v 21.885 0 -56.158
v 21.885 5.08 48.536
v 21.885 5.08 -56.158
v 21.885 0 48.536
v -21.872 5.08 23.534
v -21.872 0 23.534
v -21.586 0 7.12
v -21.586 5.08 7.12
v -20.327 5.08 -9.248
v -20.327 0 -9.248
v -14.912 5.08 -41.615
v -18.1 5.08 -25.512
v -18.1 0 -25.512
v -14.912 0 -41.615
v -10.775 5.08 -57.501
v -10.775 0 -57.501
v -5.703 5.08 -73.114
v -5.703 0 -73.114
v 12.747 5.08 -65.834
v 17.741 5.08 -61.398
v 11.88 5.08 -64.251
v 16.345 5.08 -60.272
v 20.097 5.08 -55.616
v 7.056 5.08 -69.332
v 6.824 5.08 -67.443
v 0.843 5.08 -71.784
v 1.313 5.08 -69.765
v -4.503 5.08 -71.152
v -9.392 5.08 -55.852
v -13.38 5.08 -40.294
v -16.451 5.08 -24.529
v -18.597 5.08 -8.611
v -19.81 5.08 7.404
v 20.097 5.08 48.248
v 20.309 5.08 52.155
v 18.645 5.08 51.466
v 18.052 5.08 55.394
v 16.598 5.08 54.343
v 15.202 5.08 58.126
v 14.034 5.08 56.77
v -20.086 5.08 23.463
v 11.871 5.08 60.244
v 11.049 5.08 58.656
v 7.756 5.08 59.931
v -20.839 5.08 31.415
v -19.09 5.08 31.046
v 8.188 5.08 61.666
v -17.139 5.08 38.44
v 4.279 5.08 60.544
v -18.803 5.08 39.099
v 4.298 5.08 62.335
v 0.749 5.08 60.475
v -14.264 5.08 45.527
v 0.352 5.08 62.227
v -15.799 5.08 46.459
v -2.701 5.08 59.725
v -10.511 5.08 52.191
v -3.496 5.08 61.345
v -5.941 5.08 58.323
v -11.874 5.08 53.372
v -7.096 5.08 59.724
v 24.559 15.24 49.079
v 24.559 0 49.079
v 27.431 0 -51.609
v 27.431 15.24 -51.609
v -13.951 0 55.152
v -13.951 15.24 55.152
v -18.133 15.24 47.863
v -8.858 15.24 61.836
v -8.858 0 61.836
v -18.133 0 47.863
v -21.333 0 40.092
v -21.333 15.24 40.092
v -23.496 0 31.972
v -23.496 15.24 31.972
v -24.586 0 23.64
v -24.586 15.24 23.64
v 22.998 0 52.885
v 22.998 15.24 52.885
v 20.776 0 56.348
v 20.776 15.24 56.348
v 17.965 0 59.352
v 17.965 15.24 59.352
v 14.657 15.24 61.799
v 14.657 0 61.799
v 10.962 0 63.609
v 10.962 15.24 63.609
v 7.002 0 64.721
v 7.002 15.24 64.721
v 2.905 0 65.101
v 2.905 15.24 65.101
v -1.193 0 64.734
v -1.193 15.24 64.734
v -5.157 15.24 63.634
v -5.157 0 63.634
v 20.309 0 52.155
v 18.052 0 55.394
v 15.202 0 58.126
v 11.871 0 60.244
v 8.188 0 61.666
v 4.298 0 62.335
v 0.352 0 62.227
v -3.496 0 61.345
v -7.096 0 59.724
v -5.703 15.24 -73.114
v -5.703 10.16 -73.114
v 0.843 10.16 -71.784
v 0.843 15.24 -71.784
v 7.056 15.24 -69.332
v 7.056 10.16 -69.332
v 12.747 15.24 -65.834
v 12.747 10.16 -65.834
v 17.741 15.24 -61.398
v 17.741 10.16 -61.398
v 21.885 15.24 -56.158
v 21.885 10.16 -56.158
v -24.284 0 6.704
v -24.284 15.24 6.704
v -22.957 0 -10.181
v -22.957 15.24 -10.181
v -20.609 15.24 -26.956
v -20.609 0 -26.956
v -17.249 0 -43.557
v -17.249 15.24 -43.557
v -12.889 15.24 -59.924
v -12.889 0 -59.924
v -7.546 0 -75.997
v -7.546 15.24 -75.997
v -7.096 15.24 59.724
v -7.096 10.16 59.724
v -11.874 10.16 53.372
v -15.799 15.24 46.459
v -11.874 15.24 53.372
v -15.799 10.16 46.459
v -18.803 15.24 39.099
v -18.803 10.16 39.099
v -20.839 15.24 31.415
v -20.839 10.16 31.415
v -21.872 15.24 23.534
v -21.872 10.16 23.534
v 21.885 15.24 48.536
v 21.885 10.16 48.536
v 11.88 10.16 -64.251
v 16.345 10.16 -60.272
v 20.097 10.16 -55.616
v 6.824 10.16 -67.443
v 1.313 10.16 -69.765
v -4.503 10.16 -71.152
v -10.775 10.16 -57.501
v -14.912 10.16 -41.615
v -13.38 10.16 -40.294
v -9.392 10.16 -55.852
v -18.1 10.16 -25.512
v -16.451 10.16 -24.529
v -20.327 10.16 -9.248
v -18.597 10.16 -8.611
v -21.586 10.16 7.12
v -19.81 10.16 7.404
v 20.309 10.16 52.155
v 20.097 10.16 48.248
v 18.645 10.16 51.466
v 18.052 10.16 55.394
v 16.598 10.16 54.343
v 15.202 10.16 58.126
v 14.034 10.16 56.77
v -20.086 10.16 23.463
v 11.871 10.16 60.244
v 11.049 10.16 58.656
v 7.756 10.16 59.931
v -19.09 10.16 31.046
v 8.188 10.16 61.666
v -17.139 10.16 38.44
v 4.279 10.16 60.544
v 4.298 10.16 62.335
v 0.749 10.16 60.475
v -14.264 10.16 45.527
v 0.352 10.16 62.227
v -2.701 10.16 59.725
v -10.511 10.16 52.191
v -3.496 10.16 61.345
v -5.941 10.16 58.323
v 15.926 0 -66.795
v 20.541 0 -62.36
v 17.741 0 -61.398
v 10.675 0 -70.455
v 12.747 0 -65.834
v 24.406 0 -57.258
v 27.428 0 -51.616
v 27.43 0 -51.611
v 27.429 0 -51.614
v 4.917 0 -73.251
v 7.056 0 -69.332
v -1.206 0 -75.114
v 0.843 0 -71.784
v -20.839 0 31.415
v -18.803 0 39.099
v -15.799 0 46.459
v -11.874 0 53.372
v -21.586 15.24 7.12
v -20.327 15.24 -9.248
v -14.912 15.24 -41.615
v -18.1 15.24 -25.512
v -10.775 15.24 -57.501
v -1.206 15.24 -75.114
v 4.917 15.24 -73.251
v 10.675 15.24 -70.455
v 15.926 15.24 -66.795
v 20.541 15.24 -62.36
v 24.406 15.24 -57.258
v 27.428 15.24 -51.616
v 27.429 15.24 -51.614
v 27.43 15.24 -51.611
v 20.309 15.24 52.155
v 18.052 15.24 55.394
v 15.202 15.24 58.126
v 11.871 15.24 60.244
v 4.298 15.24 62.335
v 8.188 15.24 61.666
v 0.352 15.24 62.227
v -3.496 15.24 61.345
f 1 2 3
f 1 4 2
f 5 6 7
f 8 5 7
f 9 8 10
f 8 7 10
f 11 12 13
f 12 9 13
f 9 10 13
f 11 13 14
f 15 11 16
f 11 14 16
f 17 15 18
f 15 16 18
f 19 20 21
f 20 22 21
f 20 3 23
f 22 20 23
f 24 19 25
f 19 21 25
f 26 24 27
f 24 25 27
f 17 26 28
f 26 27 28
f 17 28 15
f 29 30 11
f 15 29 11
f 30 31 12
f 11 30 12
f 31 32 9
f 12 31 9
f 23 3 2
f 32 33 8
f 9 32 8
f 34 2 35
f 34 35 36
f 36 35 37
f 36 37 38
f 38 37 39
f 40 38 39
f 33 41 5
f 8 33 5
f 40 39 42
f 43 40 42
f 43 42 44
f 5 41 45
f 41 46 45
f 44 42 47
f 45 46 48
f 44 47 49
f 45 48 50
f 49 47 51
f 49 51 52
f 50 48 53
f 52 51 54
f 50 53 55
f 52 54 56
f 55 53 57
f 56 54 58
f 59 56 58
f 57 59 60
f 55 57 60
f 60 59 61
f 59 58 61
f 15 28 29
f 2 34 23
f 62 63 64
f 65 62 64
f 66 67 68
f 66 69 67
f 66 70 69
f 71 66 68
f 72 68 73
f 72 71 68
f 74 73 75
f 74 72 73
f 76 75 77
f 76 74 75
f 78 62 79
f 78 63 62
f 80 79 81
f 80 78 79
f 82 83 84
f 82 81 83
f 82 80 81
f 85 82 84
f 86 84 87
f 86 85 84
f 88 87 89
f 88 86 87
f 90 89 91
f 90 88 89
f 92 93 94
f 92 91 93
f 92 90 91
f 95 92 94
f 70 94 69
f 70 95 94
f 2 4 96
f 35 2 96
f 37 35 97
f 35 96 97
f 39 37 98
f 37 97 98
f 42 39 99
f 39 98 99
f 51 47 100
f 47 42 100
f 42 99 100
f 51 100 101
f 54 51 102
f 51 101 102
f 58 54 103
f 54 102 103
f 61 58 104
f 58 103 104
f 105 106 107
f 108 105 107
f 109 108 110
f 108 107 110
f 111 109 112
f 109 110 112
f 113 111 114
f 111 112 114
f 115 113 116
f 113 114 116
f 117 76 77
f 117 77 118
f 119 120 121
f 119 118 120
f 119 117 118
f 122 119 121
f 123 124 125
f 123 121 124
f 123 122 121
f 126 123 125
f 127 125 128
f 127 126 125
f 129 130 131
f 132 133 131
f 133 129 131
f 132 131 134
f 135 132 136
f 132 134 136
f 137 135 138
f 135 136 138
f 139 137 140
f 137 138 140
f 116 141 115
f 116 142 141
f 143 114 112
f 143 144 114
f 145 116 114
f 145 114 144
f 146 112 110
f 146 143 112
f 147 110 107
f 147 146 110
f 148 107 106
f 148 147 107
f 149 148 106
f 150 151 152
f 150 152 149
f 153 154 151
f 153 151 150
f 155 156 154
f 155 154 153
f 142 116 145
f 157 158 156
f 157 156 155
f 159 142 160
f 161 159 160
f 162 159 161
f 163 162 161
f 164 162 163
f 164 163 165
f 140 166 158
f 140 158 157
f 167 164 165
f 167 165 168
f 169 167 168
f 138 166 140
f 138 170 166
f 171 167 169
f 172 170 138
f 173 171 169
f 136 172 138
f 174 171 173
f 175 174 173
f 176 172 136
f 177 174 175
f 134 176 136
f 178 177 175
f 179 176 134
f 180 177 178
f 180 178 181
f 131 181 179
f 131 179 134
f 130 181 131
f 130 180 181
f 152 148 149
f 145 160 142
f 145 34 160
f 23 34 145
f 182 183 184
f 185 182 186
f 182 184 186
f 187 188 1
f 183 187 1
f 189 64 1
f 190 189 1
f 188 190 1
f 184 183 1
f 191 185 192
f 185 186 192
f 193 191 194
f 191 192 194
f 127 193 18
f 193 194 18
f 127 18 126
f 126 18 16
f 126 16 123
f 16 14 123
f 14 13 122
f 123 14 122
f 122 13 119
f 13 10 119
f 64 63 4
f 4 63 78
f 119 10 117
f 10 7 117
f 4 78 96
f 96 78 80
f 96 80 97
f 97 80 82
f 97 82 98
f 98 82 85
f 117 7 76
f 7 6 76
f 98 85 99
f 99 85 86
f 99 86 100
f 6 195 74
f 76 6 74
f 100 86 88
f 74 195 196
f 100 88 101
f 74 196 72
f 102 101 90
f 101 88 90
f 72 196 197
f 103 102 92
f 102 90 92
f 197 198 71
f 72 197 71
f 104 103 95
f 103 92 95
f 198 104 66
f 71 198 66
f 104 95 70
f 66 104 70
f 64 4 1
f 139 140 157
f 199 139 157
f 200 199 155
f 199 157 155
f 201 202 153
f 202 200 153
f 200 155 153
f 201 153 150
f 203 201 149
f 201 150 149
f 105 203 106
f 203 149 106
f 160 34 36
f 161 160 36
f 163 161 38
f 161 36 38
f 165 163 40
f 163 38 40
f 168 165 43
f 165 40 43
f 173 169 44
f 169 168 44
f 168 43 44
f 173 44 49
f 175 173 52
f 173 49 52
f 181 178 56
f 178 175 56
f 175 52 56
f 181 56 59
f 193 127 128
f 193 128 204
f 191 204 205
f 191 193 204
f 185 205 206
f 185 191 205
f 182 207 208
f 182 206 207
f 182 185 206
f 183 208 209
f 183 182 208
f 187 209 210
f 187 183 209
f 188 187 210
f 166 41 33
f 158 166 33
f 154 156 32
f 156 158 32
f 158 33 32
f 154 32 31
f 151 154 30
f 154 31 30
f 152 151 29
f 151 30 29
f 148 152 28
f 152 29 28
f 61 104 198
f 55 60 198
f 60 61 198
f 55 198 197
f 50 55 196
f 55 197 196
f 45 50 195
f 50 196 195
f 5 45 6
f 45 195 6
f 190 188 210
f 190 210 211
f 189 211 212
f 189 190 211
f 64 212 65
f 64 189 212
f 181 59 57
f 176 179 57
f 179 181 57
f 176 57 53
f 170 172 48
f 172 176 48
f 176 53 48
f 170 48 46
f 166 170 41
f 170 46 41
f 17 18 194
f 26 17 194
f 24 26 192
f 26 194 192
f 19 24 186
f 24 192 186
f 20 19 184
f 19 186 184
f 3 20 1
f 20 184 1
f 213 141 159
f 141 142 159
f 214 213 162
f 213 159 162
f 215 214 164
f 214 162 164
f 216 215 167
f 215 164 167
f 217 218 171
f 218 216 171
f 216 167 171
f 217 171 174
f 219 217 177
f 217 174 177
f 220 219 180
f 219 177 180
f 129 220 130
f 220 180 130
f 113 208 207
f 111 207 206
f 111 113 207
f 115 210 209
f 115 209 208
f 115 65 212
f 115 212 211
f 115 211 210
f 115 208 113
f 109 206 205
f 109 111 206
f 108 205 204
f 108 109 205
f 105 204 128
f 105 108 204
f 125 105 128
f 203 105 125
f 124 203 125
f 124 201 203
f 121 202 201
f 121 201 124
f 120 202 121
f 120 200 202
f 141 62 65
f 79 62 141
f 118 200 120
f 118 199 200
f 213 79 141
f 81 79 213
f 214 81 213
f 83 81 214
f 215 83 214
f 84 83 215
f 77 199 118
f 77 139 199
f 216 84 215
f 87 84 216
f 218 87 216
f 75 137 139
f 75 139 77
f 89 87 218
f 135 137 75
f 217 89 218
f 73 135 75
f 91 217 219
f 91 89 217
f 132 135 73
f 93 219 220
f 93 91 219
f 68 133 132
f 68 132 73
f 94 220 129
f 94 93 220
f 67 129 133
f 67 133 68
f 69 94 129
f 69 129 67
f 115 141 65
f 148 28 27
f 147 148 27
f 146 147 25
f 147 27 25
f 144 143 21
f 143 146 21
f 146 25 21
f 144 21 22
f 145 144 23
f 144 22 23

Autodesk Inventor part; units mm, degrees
ref_plane "YZ Plane" through (0, 0, 0) normal (1, 0, 0) x (0, 1, 0)
ref_plane "XY Plane" through (0, 0, 0) normal (0, 0, 1) x (1, 0, 0)
sketch "Sketch1" plane through (0, 0, 0) normal (0, 1, 0) x (-1, 0, 0)
  arc A0 (24.5855, 23.6396) -> (8.8578, 61.8356) centre (-39.8212, 19.4554) ccw
  arc A1 (8.8578, 61.8356) -> (-24.5592, 49.0787) centre (-2.8694, 42.4084) ccw
  arc A2 (-27.4284, -51.6159) -> (7.5457, -75.9974) centre (10.0017, -35.1993) ccw
  arc A3 (7.5457, -75.9974) -> (24.5855, 23.6396) centre (-254.8198, 20.1477) ccw
  arc A4 (21.8724, 23.5336) -> (7.0955, 59.7239) centre (-39.8212, 19.4554) ccw
  arc A5 (7.0955, 59.7239) -> (-21.8846, 48.5356) centre (-2.8694, 42.4084) ccw
  arc A6 (-21.8846, -56.1581) -> (5.7032, -73.1142) centre (10.0017, -35.1993) ccw
  arc A7 (5.7032, -73.1142) -> (21.8724, 23.5336) centre (-254.8198, 20.1477) ccw
  line L0 (-21.8846, 48.5356) -> (-21.8846, -56.1581)
  line L1 (-24.5592, 49.0787) -> (-27.4313, -51.6092)
  arc A8 (24.5855, 23.6396) -> (8.8578, 61.8356) centre (-39.8212, 19.4554) ccw
  arc A9 (8.8578, 61.8356) -> (-24.5592, 49.0787) centre (-2.8694, 42.4084) ccw
  arc A10 (-27.4313, -51.6092) -> (7.5457, -75.9974) centre (10.0017, -35.1993) ccw
  arc A11 (7.5457, -75.9974) -> (24.5855, 23.6396) centre (-254.8198, 20.1477) ccw
  line L2 (-24.5592, 49.0787) -> (-27.4313, -51.6092)
  point P0 (0, 0)
extrude "Extrusion1" add sketch "Sketch1" along normal blind 15.24
sketch "Sketch2" plane through (0, 0, 0) normal (0, 1, 0) x (-1, 0, 0)
  arc A0 (21.8724, 23.5336) -> (7.0955, 59.7239) centre (-39.8212, 19.4554) ccw projected
  arc A1 (5.7032, -73.1142) -> (21.8724, 23.5336) centre (-254.8198, 20.1477) ccw projected
  arc A2 (-21.8846, -56.1581) -> (5.7032, -73.1142) centre (10.0017, -35.1993) ccw projected
  line L0 (-21.8846, -56.1581) -> (-21.8846, 48.5356) projected
  arc A3 (7.0955, 59.7239) -> (-21.8846, 48.5356) centre (-2.8694, 42.4084) ccw projected
  arc A4 (20.2233, 23.4688) -> (6.03, 58.4313) centre (-39.8212, 19.4554) ccw
  arc A5 (6.03, 58.4313) -> (-20.235, 48.2707) centre (-2.8694, 42.4084) ccw
  line L1 (-20.235, 48.2707) -> (-20.235, -55.6586)
  arc A6 (-20.235, -55.6586) -> (4.5953, -71.3048) centre (10.0017, -35.1993) ccw
  arc A7 (4.5953, -71.3048) -> (20.2233, 23.4688) centre (-254.8198, 20.1477) ccw
  arc A8 (21.96, 23.537) -> (7.1522, 59.7924) centre (-39.8212, 19.4554) ccw
  arc A9 (7.1522, 59.7924) -> (-21.9723, 48.5494) centre (-2.8694, 42.4084) ccw
  line L2 (-21.9723, 48.5494) -> (-21.9723, -56.1844)
  arc A10 (-21.9723, -56.1844) -> (5.7624, -73.209) centre (10.0017, -35.1993) ccw
  arc A11 (5.7624, -73.209) -> (21.96, 23.537) centre (-254.8198, 20.1477) ccw
  point P0 (0, 0)
ref_plane "Work Plane2" through (0, 7.62, 0) normal (0, 1, 0) x (-1, 0, 0)
sketch "Sketch3" plane through (0, 7.62, 0) normal (0, 1, 0) x (-1, 0, 0)
  arc A0 (21.8724, 23.5336) -> (7.0955, 59.7239) centre (-39.8212, 19.4554) ccw projected
  arc A1 (5.7032, -73.1142) -> (21.8724, 23.5336) centre (-254.8198, 20.1477) ccw projected
  arc A2 (-21.8846, -56.1581) -> (5.7032, -73.1142) centre (10.0017, -35.1993) ccw projected
  arc A3 (5.7032, -73.1142) -> (21.8724, 23.5336) centre (-254.8198, 20.1477) ccw projected
  arc A4 (-21.8846, -56.1581) -> (5.7032, -73.1142) centre (10.0017, -35.1993) ccw projected
  line L0 (-21.8846, -56.1581) -> (-21.8846, 48.5356) projected
  arc A5 (7.0955, 59.7239) -> (-21.8846, 48.5356) centre (-2.8694, 42.4084) ccw projected
  arc A6 (21.8724, 23.5336) -> (7.0955, 59.7239) centre (-39.8212, 19.4554) ccw projected
  arc A7 (8.8578, 61.8356) -> (-24.5592, 49.0787) centre (-2.8694, 42.4084) ccw projected
  line L1 (-24.5592, 49.0787) -> (-27.4313, -51.6092) projected
  arc A8 (-27.4313, -51.6092) -> (7.5457, -75.9974) centre (10.0017, -35.1993) ccw projected
  arc A9 (7.5457, -75.9974) -> (24.5855, 23.6396) centre (-254.8198, 20.1477) ccw projected
  arc A10 (24.5855, 23.6396) -> (8.8578, 61.8356) centre (-39.8212, 19.4554) ccw projected
  arc A11 (20.0927, 23.4636) -> (5.7444, 58.5644) centre (-39.8212, 19.4554) ccw
  arc A12 (4.508, -71.1594) -> (20.0927, 23.4636) centre (-254.8198, 20.1477) ccw
  arc A13 (-20.3969, -55.1802) -> (4.508, -71.1594) centre (10.0017, -35.1993) ccw
  line L2 (-20.0973, 48.248) -> (-20.0973, -55.6163)
  arc A14 (-20.0973, -55.6163) -> (4.5033, -71.1517) centre (10.0017, -35.1993) ccw
  arc A15 (4.5033, -71.1517) -> (20.0858, 23.4633) centre (-254.8198, 20.1477) ccw
  arc A16 (20.0858, 23.4633) -> (5.9414, 58.323) centre (-39.8212, 19.4554) ccw
  arc A17 (5.9414, 58.323) -> (-20.0973, 48.248) centre (-2.8694, 42.4084) ccw
  arc A18 (21.9213, 23.5355) -> (7.1272, 59.7622) centre (-39.8212, 19.4554) ccw
  arc A19 (5.7363, -73.1672) -> (21.9213, 23.5355) centre (-254.8198, 20.1477) ccw
  arc A20 (-21.9336, -56.1728) -> (5.7363, -73.1672) centre (10.0017, -35.1993) ccw
  line L3 (-21.9336, -56.1728) -> (-21.9336, 48.5433)
  arc A21 (7.1272, 59.7622) -> (-21.9336, 48.5433) centre (-2.8694, 42.4084) ccw
  point P0 (0, 0)
extrude "Extrusion2" add sketch "Sketch3" along normal mid plane 5.08 contours A1 A2 L0 A5 A0
properties part number "track" material "PBT Plastic"
